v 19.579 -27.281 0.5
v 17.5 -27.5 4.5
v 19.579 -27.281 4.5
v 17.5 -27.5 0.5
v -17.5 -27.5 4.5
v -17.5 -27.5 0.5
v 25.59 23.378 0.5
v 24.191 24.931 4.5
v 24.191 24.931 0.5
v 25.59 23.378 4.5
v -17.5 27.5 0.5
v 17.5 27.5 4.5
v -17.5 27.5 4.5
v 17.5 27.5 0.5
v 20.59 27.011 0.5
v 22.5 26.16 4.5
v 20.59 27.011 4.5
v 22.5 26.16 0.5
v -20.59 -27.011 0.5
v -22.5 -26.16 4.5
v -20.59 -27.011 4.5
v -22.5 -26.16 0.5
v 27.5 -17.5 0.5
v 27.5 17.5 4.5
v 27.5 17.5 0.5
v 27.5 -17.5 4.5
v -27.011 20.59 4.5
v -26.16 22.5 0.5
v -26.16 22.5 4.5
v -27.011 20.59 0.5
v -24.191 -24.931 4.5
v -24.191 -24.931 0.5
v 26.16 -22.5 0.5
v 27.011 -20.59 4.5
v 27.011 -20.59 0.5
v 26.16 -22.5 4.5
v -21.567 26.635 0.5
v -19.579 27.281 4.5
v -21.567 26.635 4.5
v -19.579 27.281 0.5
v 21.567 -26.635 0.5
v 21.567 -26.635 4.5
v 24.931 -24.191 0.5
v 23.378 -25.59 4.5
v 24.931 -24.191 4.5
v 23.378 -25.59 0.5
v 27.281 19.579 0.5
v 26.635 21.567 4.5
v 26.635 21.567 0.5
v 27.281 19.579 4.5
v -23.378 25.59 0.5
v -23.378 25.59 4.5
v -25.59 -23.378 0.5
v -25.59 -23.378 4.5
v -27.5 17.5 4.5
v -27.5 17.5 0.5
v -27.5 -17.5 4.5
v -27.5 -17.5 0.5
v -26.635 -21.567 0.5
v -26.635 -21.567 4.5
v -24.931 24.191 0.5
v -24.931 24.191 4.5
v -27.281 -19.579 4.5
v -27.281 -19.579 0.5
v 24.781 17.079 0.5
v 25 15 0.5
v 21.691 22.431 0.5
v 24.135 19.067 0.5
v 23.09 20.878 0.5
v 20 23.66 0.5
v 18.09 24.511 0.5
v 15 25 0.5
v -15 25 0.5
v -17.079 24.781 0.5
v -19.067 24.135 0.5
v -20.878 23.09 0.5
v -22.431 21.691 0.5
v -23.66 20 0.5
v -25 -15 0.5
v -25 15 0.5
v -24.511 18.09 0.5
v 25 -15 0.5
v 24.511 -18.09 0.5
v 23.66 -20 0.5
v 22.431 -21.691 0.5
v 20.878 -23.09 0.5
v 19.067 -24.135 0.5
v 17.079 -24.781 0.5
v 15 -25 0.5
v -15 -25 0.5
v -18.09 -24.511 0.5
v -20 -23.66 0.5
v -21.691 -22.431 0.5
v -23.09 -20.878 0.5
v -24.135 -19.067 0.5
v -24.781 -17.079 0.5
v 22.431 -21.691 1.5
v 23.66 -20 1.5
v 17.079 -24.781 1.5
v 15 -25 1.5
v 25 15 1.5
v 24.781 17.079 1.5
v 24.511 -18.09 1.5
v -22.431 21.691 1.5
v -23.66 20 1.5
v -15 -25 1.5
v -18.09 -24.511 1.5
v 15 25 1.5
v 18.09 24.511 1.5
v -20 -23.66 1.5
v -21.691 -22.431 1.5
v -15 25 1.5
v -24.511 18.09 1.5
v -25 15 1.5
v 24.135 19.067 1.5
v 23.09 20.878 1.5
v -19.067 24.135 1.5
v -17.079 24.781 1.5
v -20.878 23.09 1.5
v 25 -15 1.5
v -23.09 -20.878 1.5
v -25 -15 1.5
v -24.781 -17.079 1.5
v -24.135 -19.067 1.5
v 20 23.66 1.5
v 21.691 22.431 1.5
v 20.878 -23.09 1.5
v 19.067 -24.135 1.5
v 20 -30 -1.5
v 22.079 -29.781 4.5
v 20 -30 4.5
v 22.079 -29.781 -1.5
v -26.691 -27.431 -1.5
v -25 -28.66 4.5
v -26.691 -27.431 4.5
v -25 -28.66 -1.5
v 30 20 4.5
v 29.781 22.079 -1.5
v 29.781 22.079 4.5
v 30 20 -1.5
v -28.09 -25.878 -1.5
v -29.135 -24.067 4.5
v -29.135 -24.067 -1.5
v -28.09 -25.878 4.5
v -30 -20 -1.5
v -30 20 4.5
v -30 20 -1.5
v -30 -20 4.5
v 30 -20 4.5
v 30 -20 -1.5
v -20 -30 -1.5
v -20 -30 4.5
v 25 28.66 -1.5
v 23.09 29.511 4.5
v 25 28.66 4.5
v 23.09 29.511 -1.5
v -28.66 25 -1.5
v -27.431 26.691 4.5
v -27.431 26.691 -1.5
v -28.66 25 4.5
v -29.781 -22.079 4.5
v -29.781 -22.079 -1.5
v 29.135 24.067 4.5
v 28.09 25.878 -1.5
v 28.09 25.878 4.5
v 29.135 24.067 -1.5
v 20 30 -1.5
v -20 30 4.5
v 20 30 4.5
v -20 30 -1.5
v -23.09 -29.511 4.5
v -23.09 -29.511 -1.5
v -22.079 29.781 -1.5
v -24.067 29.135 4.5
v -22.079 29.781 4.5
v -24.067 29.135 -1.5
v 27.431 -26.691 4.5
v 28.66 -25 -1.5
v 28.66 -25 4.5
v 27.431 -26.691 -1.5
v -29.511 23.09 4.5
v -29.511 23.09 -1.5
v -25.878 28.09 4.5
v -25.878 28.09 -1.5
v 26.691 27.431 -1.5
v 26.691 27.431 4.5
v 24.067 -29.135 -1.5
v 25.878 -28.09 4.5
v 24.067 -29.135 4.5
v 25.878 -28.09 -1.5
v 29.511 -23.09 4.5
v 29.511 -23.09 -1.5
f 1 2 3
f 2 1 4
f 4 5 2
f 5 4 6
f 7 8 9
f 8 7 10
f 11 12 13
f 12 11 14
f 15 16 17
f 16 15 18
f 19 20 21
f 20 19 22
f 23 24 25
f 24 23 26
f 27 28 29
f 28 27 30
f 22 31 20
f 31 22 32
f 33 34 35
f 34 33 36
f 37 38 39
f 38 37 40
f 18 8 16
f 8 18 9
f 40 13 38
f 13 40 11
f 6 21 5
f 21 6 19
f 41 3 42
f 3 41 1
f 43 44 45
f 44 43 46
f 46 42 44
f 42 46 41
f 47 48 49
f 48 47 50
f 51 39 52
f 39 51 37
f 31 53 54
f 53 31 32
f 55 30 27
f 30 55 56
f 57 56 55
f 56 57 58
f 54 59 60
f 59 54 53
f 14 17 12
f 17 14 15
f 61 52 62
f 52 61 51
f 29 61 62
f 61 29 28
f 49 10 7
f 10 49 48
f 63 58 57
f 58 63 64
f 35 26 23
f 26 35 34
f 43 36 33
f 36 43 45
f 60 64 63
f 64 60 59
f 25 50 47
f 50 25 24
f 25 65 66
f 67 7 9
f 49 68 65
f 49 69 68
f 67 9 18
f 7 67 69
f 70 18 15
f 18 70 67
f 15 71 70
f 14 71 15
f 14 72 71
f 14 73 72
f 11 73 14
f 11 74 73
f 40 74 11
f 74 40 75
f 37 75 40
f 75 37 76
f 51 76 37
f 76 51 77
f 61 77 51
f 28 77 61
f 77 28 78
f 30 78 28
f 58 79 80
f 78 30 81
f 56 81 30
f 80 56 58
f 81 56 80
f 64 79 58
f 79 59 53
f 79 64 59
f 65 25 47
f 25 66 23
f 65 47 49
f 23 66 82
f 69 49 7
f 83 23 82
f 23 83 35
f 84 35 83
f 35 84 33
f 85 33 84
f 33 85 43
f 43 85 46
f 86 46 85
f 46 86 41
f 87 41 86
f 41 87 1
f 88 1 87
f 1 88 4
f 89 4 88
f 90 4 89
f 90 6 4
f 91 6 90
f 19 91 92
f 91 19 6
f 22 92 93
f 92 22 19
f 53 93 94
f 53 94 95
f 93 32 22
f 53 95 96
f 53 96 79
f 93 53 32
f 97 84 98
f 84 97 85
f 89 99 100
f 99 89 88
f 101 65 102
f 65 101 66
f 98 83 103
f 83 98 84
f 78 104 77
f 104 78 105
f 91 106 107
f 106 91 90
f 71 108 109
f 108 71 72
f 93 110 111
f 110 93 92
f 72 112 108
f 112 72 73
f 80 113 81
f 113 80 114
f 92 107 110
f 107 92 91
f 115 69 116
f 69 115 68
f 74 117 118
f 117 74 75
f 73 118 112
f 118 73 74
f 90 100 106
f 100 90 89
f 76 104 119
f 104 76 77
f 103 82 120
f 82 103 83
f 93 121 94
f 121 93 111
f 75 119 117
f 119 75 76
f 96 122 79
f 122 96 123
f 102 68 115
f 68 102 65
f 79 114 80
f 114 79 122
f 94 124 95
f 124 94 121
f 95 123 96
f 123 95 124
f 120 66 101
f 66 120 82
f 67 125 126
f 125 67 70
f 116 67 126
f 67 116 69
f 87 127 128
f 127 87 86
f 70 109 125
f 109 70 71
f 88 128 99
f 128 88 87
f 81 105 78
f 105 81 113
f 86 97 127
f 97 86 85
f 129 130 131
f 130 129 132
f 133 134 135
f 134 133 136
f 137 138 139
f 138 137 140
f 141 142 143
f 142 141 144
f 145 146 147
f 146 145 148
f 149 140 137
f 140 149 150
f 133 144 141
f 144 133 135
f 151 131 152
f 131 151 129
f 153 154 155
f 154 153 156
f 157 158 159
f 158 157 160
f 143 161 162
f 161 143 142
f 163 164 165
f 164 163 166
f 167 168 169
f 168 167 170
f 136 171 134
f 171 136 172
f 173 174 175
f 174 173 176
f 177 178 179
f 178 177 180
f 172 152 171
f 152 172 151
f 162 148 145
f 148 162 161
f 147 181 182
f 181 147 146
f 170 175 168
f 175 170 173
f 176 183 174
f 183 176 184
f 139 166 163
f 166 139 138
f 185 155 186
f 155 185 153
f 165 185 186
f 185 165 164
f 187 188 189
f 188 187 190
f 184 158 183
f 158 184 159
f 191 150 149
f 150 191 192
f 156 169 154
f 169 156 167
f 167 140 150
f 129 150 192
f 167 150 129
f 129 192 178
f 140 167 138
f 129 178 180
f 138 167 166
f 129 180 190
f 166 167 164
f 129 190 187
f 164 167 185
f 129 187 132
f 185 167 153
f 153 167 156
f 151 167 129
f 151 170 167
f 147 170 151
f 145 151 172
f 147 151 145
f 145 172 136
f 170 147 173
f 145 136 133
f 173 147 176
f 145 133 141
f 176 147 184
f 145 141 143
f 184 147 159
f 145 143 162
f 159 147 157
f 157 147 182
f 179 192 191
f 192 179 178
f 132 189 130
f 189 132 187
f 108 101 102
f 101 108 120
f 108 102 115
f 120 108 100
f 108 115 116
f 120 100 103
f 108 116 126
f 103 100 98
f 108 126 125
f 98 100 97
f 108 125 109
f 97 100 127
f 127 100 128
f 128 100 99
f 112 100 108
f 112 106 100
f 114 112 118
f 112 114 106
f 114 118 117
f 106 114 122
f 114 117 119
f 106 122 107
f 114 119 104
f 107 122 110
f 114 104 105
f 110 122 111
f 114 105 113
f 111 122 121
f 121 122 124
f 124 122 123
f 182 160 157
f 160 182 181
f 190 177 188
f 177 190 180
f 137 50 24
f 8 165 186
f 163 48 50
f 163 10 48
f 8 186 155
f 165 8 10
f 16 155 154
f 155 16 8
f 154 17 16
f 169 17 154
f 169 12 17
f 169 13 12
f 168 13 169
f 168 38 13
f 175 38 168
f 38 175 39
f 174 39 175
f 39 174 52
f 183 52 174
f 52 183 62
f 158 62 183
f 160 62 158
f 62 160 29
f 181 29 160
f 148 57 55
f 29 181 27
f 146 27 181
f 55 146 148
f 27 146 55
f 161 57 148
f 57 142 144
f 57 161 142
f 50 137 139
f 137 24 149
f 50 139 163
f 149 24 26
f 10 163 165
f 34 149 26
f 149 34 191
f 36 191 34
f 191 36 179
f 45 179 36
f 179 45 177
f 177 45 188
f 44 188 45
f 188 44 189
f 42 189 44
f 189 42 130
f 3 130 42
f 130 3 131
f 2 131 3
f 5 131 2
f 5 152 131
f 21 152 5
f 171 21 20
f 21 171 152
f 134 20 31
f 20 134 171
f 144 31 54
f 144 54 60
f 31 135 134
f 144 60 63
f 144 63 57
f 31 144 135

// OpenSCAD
/*
 * Test for a stamp mold
 */
echo(version=version());

logo = "./images/minion.04.small.png"; 
imgRatio = 1.5;
logox = 500 * imgRatio; 
logoy = 524 * imgRatio; 

module roundedRect(size, radius) {  
	linear_extrude(height=size.z, center=true) {
		offset(radius) offset(-radius) {
			square([size.x, size.y], center = true);
		}
	}
}

// Base plate
// ----------
plateWidth = 60;
plateLength = 60;
plateThickNess = 3;
cornerRadius = 10;

difference() {  
	union() {
		difference() {
			roundedRect([plateWidth, plateLength, plateThickNess], cornerRadius);
			translate([0, 0, 2]) {
				scale([.9 * plateWidth / logox, .9 * plateWidth / logoy, .02]) {
					color("white") {
						rotate([0, 0, -90]) {
							surface(file=logo, invert=true, center=true);
						}
					}
				}
        // the groove around the picture
        difference() {
          roundedRect([plateWidth -  5, plateLength -  5, plateThickNess], cornerRadius);
          roundedRect([plateWidth - 10, plateLength - 10, plateThickNess * 1.1], cornerRadius);
        }
			}
		}
		// The frame
		translate([0, 0, (plateThickNess / 1)]) {
			difference() {
				roundedRect([plateWidth, plateLength, plateThickNess], cornerRadius);
				roundedRect([plateWidth - 5, plateLength - 5, plateThickNess * 1.1], cornerRadius);
			}
		}
	}
}
